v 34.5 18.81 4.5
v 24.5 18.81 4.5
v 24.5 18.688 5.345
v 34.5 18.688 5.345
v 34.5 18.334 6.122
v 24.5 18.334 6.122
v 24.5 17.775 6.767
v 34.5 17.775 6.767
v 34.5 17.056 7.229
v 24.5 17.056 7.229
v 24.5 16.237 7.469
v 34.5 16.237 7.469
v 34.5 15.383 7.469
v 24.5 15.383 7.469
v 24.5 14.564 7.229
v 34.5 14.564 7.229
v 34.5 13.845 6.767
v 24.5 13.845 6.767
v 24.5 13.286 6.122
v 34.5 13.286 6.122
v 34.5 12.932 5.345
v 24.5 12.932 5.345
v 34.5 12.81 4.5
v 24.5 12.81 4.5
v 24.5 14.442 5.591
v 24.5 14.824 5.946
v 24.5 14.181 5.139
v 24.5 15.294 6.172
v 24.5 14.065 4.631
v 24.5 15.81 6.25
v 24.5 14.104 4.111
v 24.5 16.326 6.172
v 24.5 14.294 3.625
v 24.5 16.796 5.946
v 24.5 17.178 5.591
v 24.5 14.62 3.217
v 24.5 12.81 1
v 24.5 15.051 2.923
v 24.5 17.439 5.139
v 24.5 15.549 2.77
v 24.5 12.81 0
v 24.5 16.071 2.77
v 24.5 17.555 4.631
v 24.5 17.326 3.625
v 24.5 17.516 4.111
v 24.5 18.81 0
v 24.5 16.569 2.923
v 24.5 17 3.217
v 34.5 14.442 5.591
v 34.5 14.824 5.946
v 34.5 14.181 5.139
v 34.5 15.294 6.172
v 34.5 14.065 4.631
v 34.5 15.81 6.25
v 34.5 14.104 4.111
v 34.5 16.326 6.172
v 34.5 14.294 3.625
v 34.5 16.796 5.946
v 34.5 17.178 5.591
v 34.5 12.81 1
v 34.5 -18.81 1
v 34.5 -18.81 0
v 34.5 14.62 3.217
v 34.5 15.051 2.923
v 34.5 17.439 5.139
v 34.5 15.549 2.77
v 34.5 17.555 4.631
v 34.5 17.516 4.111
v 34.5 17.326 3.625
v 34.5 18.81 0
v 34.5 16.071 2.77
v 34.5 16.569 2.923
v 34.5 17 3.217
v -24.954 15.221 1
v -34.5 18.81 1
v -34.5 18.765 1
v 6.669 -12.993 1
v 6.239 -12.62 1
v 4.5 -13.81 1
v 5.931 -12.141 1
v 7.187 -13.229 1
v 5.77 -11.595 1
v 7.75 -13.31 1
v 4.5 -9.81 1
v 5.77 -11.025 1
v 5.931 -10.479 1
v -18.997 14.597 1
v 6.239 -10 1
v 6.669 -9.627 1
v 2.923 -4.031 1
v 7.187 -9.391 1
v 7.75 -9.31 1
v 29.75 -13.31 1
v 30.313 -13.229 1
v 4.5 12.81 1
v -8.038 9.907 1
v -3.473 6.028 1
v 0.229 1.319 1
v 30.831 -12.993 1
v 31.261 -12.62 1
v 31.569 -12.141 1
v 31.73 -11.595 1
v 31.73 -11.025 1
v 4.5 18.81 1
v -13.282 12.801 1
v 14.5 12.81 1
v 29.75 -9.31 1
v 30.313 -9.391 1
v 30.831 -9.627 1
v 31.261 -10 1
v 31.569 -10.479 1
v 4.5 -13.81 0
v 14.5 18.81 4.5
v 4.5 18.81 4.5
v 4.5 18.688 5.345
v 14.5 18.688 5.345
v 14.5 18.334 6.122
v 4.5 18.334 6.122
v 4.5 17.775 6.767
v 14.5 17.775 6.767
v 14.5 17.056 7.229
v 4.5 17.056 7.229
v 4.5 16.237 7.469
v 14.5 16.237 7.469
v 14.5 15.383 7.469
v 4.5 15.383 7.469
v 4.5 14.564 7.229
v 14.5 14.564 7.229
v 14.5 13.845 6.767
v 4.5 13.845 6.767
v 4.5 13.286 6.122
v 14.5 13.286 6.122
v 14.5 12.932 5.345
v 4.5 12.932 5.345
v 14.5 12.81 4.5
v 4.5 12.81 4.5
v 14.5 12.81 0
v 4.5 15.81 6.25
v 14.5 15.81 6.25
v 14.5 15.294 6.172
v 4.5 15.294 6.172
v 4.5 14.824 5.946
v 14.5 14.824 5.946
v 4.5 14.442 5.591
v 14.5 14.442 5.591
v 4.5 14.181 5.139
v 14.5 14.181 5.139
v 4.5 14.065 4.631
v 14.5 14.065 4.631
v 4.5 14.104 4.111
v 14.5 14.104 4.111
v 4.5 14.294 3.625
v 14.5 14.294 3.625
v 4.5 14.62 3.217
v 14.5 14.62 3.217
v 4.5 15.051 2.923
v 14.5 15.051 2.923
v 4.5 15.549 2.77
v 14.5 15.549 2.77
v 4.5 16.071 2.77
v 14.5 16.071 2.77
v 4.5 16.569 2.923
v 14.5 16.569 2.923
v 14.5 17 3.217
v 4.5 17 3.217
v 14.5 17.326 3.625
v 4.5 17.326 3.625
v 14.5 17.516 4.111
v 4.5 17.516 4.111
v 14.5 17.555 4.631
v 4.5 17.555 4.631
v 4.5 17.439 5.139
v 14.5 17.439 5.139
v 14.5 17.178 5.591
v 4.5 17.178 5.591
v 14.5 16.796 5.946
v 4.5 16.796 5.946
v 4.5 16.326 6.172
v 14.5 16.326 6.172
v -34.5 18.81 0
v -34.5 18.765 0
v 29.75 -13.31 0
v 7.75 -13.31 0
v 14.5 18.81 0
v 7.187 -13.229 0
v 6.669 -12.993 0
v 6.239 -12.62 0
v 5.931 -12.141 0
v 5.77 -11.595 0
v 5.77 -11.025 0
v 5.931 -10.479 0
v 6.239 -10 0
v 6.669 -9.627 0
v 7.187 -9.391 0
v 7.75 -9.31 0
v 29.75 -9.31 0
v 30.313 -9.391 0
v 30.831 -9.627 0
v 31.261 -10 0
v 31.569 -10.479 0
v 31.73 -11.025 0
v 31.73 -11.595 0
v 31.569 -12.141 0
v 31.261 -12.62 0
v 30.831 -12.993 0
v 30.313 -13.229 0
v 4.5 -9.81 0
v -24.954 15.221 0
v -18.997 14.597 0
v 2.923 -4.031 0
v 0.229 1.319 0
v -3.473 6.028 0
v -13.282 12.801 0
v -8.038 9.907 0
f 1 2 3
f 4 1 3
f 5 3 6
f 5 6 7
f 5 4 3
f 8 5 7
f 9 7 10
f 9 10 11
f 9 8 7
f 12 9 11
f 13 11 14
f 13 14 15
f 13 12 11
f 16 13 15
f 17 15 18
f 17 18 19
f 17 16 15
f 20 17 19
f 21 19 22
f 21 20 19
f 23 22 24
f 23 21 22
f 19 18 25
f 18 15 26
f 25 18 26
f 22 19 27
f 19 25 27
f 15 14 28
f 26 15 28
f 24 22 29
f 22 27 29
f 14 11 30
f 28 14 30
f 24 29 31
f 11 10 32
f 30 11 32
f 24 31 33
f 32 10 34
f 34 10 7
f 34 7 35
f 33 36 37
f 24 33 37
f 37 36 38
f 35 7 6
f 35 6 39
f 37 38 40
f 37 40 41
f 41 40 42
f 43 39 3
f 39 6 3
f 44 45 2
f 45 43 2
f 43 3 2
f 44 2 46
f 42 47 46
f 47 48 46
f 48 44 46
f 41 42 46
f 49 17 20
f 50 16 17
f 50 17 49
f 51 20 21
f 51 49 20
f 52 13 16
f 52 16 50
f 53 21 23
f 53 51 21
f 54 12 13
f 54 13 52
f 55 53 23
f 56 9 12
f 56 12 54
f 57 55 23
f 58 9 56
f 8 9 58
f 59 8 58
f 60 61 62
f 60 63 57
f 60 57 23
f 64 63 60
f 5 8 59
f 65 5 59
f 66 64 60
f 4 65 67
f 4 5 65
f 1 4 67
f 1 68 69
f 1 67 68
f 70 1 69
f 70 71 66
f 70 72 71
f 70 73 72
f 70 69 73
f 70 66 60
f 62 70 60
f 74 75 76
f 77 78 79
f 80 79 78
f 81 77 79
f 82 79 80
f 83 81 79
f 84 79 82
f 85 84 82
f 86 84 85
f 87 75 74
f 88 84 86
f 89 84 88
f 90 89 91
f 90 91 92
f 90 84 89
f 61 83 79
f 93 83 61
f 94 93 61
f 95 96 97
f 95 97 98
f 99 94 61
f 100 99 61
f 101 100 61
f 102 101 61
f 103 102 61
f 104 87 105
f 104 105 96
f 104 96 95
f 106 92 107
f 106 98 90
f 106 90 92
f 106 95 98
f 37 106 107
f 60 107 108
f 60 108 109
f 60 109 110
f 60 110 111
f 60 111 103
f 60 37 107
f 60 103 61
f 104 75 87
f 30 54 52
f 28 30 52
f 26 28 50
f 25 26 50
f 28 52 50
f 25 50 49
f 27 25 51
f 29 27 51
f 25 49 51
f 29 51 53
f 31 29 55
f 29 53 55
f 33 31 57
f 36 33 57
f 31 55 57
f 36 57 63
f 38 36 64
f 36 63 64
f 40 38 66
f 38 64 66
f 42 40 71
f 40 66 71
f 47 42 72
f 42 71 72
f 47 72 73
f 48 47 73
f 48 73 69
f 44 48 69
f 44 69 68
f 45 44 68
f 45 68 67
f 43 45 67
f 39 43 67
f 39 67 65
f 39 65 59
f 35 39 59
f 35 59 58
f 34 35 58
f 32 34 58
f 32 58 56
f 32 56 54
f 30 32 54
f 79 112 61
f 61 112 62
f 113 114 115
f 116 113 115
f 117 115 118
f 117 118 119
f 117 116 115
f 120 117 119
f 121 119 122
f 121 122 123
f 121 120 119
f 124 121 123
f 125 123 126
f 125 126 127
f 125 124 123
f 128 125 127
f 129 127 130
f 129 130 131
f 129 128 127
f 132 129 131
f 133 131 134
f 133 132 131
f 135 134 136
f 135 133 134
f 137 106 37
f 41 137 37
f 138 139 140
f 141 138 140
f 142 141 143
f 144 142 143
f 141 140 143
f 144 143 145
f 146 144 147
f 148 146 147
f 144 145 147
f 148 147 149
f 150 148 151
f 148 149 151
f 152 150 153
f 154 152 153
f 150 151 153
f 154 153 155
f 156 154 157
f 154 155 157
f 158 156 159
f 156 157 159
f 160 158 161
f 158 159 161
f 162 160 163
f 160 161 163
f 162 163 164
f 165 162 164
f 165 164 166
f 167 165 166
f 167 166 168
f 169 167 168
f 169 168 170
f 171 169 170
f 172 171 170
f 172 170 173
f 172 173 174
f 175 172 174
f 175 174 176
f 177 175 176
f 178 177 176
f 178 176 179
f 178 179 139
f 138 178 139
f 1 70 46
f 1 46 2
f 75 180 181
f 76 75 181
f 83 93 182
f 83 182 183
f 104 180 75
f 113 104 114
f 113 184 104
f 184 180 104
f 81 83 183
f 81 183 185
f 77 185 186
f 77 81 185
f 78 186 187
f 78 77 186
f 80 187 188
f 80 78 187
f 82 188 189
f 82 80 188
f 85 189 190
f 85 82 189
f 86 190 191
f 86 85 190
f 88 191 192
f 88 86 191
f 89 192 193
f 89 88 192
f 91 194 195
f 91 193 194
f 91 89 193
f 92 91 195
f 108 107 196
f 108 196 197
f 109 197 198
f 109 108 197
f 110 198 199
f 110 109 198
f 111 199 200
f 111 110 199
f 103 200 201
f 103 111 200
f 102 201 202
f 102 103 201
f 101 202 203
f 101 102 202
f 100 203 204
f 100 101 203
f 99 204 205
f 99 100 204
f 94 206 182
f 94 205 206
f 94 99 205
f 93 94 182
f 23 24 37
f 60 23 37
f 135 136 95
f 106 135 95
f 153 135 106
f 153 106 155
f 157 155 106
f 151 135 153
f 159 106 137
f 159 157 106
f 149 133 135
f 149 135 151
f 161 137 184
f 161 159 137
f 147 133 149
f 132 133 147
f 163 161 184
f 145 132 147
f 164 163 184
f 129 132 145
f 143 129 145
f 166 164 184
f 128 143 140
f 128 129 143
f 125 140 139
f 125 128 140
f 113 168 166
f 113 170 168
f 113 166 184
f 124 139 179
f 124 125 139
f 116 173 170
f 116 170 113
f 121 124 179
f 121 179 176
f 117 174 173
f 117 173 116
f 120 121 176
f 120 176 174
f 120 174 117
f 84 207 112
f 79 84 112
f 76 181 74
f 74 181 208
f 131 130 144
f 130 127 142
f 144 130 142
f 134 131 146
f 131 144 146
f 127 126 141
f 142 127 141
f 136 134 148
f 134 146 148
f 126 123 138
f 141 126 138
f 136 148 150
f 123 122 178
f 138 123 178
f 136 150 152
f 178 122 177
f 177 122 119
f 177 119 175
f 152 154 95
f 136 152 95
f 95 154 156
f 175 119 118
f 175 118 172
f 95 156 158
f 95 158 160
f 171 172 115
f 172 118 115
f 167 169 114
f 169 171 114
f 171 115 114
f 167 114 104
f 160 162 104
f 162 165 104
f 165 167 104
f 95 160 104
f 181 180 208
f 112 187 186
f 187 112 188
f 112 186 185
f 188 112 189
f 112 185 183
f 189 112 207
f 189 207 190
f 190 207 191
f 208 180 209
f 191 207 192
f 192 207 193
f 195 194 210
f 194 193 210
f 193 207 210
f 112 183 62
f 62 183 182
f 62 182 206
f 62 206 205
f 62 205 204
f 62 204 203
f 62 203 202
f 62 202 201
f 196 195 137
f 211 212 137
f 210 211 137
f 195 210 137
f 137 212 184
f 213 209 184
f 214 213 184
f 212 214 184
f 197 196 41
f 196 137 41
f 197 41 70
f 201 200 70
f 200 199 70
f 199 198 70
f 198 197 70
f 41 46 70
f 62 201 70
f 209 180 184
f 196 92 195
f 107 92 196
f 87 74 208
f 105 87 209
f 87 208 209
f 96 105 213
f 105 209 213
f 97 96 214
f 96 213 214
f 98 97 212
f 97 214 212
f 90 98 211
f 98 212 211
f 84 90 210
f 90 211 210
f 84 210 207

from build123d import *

# Parameters (mm, degrees)
BOSS_EXTRUDE1_DEPTH = 1
CUT_EXTRUDE1_DEPTH  = 40.307328833
BOSS_EXTRUDE2_DEPTH = 10
LPATTERN1_COUNT     = 2
LPATTERN1_PITCH     = 20
CUT_EXTRUDE2_REACH  = 73.91
SKETCH4_R           = 1.75
CUT_EXTRUDE3_REACH  = 41.829
SKETCH5_W           = 10
SKETCH5_H           = 6
CHAMFER1_START      = -11.379677933
CHAMFER1_OUTLINE_W  = 13
CHAMFER1_OUTLINE_H  = 2
CHAMFER1_DEPTH      = 16.961310673


with BuildPart() as part:
    # Sketch1 → Boss-Extrude1 (new body)
    with BuildSketch(Plane.XY):
        with BuildLine():
            Line((4.5, -13.81), (34.5, -18.81))
            Line((34.5, -18.81), (34.5, 18.81))
            Line((34.5, 18.81), (-34.5, 18.81))
            Line((-34.5, 18.81), (-34.5, 14.81))
            Line((-34.5, 14.81), (-26.5, 15.18758956))
            ThreePointArc((-26.5, 15.18758956), (-6.254140463, 8.574228065), (4.5, -9.81))
            Line((4.5, -9.81), (4.5, -13.81))
        make_face()
    extrude(amount=BOSS_EXTRUDE1_DEPTH)

    # Sketch2 → Cut-Extrude1 (cut, through all)
    with BuildSketch(Plane.XY.offset(1)):
        with BuildLine():
            Line((7.75, -9.31), (29.75, -9.31))
            ThreePointArc((29.75, -9.31), (31.75, -11.31), (29.75, -13.31))
            Line((29.75, -13.31), (7.75, -13.31))
            ThreePointArc((7.75, -13.31), (5.75, -11.31), (7.75, -9.31))
        make_face()
    extrude(amount=-CUT_EXTRUDE1_DEPTH, mode=Mode.SUBTRACT)

    # Sketch3 → Boss-Extrude2 (add)
    with BuildSketch(Plane(origin=(34.5, 0, 0), x_dir=(0, 0, -1), z_dir=(1, 0, 0))):
        with BuildLine():
            Line((-1, 18.81), (-4.5, 18.81))
            ThreePointArc((-4.5, 18.81), (-7.5, 15.81), (-4.5, 12.81))
            Line((-4.5, 12.81), (-1, 12.81))
            Line((-1, 12.81), (-1, 18.81))
        make_face()
    boss_extrude2 = extrude(amount=-BOSS_EXTRUDE2_DEPTH)

    # LPattern1: Boss-Extrude2 ×2
    with Locations(*[(-i * LPATTERN1_PITCH, 0, 0) for i in range(1, LPATTERN1_COUNT)]):
        add(boss_extrude2)

    # Cut-Extrude2: up to this face of the body (flat: up to its plane)
    cut_extrude2_end = Plane(part.part.faces().sort_by_distance((4.5, 15.81, 3.966377012))[0])
    # Sketch4 → Cut-Extrude2 (cut, up to the picked face)
    with BuildSketch(Plane(origin=(34.5, 0, 0), x_dir=(0, 0, -1), z_dir=(1, 0, 0)), mode=Mode.PRIVATE) as cut_extrude2_sk1:
        with Locations(Location((-4.5, 15.81, 0), (0, 0, 180))):
            Circle(SKETCH4_R)
    cut_extrude2_tool1 = split(extrude(cut_extrude2_sk1.sketch, amount=-CUT_EXTRUDE2_REACH, mode=Mode.PRIVATE), bisect_by=cut_extrude2_end, keep=Keep.BOTH, mode=Mode.PRIVATE)
    add(cut_extrude2_tool1.solids().sort_by(Axis((34.5, 15.81, 4.5), (-1, 0, 0)))[0], mode=Mode.SUBTRACT)

    # Sketch5 → Cut-Extrude3 (cut, up to next)
    with BuildSketch(Plane.XY.offset(1), mode=Mode.PRIVATE) as cut_extrude3_sk1:
        with Locations((19.5, 15.81)):
            Rectangle(SKETCH5_W, SKETCH5_H)
    cut_extrude3_tool1 = extrude(cut_extrude3_sk1.sketch, amount=-CUT_EXTRUDE3_REACH, mode=Mode.PRIVATE) & part.part
    add(cut_extrude3_tool1.solids().sort_by_distance((19.5, 15.81, 1))[0], mode=Mode.SUBTRACT)

    # Chamfer1: read off the stored shape, not the designer's step
    # Chamfer1 outline → Chamfer1 (cut)
    with BuildSketch(Plane(origin=(0, 0, 0), x_dir=(0.937451280255772, -0.34811649938894607, 0), z_dir=(0.34811649938894607, 0.9374512802557721, 0)).offset(CHAMFER1_START)):
        with Locations((-33.5, 0)):
            Rectangle(CHAMFER1_OUTLINE_W, CHAMFER1_OUTLINE_H)
    extrude(amount=CHAMFER1_DEPTH, mode=Mode.SUBTRACT)


solid = part.part
